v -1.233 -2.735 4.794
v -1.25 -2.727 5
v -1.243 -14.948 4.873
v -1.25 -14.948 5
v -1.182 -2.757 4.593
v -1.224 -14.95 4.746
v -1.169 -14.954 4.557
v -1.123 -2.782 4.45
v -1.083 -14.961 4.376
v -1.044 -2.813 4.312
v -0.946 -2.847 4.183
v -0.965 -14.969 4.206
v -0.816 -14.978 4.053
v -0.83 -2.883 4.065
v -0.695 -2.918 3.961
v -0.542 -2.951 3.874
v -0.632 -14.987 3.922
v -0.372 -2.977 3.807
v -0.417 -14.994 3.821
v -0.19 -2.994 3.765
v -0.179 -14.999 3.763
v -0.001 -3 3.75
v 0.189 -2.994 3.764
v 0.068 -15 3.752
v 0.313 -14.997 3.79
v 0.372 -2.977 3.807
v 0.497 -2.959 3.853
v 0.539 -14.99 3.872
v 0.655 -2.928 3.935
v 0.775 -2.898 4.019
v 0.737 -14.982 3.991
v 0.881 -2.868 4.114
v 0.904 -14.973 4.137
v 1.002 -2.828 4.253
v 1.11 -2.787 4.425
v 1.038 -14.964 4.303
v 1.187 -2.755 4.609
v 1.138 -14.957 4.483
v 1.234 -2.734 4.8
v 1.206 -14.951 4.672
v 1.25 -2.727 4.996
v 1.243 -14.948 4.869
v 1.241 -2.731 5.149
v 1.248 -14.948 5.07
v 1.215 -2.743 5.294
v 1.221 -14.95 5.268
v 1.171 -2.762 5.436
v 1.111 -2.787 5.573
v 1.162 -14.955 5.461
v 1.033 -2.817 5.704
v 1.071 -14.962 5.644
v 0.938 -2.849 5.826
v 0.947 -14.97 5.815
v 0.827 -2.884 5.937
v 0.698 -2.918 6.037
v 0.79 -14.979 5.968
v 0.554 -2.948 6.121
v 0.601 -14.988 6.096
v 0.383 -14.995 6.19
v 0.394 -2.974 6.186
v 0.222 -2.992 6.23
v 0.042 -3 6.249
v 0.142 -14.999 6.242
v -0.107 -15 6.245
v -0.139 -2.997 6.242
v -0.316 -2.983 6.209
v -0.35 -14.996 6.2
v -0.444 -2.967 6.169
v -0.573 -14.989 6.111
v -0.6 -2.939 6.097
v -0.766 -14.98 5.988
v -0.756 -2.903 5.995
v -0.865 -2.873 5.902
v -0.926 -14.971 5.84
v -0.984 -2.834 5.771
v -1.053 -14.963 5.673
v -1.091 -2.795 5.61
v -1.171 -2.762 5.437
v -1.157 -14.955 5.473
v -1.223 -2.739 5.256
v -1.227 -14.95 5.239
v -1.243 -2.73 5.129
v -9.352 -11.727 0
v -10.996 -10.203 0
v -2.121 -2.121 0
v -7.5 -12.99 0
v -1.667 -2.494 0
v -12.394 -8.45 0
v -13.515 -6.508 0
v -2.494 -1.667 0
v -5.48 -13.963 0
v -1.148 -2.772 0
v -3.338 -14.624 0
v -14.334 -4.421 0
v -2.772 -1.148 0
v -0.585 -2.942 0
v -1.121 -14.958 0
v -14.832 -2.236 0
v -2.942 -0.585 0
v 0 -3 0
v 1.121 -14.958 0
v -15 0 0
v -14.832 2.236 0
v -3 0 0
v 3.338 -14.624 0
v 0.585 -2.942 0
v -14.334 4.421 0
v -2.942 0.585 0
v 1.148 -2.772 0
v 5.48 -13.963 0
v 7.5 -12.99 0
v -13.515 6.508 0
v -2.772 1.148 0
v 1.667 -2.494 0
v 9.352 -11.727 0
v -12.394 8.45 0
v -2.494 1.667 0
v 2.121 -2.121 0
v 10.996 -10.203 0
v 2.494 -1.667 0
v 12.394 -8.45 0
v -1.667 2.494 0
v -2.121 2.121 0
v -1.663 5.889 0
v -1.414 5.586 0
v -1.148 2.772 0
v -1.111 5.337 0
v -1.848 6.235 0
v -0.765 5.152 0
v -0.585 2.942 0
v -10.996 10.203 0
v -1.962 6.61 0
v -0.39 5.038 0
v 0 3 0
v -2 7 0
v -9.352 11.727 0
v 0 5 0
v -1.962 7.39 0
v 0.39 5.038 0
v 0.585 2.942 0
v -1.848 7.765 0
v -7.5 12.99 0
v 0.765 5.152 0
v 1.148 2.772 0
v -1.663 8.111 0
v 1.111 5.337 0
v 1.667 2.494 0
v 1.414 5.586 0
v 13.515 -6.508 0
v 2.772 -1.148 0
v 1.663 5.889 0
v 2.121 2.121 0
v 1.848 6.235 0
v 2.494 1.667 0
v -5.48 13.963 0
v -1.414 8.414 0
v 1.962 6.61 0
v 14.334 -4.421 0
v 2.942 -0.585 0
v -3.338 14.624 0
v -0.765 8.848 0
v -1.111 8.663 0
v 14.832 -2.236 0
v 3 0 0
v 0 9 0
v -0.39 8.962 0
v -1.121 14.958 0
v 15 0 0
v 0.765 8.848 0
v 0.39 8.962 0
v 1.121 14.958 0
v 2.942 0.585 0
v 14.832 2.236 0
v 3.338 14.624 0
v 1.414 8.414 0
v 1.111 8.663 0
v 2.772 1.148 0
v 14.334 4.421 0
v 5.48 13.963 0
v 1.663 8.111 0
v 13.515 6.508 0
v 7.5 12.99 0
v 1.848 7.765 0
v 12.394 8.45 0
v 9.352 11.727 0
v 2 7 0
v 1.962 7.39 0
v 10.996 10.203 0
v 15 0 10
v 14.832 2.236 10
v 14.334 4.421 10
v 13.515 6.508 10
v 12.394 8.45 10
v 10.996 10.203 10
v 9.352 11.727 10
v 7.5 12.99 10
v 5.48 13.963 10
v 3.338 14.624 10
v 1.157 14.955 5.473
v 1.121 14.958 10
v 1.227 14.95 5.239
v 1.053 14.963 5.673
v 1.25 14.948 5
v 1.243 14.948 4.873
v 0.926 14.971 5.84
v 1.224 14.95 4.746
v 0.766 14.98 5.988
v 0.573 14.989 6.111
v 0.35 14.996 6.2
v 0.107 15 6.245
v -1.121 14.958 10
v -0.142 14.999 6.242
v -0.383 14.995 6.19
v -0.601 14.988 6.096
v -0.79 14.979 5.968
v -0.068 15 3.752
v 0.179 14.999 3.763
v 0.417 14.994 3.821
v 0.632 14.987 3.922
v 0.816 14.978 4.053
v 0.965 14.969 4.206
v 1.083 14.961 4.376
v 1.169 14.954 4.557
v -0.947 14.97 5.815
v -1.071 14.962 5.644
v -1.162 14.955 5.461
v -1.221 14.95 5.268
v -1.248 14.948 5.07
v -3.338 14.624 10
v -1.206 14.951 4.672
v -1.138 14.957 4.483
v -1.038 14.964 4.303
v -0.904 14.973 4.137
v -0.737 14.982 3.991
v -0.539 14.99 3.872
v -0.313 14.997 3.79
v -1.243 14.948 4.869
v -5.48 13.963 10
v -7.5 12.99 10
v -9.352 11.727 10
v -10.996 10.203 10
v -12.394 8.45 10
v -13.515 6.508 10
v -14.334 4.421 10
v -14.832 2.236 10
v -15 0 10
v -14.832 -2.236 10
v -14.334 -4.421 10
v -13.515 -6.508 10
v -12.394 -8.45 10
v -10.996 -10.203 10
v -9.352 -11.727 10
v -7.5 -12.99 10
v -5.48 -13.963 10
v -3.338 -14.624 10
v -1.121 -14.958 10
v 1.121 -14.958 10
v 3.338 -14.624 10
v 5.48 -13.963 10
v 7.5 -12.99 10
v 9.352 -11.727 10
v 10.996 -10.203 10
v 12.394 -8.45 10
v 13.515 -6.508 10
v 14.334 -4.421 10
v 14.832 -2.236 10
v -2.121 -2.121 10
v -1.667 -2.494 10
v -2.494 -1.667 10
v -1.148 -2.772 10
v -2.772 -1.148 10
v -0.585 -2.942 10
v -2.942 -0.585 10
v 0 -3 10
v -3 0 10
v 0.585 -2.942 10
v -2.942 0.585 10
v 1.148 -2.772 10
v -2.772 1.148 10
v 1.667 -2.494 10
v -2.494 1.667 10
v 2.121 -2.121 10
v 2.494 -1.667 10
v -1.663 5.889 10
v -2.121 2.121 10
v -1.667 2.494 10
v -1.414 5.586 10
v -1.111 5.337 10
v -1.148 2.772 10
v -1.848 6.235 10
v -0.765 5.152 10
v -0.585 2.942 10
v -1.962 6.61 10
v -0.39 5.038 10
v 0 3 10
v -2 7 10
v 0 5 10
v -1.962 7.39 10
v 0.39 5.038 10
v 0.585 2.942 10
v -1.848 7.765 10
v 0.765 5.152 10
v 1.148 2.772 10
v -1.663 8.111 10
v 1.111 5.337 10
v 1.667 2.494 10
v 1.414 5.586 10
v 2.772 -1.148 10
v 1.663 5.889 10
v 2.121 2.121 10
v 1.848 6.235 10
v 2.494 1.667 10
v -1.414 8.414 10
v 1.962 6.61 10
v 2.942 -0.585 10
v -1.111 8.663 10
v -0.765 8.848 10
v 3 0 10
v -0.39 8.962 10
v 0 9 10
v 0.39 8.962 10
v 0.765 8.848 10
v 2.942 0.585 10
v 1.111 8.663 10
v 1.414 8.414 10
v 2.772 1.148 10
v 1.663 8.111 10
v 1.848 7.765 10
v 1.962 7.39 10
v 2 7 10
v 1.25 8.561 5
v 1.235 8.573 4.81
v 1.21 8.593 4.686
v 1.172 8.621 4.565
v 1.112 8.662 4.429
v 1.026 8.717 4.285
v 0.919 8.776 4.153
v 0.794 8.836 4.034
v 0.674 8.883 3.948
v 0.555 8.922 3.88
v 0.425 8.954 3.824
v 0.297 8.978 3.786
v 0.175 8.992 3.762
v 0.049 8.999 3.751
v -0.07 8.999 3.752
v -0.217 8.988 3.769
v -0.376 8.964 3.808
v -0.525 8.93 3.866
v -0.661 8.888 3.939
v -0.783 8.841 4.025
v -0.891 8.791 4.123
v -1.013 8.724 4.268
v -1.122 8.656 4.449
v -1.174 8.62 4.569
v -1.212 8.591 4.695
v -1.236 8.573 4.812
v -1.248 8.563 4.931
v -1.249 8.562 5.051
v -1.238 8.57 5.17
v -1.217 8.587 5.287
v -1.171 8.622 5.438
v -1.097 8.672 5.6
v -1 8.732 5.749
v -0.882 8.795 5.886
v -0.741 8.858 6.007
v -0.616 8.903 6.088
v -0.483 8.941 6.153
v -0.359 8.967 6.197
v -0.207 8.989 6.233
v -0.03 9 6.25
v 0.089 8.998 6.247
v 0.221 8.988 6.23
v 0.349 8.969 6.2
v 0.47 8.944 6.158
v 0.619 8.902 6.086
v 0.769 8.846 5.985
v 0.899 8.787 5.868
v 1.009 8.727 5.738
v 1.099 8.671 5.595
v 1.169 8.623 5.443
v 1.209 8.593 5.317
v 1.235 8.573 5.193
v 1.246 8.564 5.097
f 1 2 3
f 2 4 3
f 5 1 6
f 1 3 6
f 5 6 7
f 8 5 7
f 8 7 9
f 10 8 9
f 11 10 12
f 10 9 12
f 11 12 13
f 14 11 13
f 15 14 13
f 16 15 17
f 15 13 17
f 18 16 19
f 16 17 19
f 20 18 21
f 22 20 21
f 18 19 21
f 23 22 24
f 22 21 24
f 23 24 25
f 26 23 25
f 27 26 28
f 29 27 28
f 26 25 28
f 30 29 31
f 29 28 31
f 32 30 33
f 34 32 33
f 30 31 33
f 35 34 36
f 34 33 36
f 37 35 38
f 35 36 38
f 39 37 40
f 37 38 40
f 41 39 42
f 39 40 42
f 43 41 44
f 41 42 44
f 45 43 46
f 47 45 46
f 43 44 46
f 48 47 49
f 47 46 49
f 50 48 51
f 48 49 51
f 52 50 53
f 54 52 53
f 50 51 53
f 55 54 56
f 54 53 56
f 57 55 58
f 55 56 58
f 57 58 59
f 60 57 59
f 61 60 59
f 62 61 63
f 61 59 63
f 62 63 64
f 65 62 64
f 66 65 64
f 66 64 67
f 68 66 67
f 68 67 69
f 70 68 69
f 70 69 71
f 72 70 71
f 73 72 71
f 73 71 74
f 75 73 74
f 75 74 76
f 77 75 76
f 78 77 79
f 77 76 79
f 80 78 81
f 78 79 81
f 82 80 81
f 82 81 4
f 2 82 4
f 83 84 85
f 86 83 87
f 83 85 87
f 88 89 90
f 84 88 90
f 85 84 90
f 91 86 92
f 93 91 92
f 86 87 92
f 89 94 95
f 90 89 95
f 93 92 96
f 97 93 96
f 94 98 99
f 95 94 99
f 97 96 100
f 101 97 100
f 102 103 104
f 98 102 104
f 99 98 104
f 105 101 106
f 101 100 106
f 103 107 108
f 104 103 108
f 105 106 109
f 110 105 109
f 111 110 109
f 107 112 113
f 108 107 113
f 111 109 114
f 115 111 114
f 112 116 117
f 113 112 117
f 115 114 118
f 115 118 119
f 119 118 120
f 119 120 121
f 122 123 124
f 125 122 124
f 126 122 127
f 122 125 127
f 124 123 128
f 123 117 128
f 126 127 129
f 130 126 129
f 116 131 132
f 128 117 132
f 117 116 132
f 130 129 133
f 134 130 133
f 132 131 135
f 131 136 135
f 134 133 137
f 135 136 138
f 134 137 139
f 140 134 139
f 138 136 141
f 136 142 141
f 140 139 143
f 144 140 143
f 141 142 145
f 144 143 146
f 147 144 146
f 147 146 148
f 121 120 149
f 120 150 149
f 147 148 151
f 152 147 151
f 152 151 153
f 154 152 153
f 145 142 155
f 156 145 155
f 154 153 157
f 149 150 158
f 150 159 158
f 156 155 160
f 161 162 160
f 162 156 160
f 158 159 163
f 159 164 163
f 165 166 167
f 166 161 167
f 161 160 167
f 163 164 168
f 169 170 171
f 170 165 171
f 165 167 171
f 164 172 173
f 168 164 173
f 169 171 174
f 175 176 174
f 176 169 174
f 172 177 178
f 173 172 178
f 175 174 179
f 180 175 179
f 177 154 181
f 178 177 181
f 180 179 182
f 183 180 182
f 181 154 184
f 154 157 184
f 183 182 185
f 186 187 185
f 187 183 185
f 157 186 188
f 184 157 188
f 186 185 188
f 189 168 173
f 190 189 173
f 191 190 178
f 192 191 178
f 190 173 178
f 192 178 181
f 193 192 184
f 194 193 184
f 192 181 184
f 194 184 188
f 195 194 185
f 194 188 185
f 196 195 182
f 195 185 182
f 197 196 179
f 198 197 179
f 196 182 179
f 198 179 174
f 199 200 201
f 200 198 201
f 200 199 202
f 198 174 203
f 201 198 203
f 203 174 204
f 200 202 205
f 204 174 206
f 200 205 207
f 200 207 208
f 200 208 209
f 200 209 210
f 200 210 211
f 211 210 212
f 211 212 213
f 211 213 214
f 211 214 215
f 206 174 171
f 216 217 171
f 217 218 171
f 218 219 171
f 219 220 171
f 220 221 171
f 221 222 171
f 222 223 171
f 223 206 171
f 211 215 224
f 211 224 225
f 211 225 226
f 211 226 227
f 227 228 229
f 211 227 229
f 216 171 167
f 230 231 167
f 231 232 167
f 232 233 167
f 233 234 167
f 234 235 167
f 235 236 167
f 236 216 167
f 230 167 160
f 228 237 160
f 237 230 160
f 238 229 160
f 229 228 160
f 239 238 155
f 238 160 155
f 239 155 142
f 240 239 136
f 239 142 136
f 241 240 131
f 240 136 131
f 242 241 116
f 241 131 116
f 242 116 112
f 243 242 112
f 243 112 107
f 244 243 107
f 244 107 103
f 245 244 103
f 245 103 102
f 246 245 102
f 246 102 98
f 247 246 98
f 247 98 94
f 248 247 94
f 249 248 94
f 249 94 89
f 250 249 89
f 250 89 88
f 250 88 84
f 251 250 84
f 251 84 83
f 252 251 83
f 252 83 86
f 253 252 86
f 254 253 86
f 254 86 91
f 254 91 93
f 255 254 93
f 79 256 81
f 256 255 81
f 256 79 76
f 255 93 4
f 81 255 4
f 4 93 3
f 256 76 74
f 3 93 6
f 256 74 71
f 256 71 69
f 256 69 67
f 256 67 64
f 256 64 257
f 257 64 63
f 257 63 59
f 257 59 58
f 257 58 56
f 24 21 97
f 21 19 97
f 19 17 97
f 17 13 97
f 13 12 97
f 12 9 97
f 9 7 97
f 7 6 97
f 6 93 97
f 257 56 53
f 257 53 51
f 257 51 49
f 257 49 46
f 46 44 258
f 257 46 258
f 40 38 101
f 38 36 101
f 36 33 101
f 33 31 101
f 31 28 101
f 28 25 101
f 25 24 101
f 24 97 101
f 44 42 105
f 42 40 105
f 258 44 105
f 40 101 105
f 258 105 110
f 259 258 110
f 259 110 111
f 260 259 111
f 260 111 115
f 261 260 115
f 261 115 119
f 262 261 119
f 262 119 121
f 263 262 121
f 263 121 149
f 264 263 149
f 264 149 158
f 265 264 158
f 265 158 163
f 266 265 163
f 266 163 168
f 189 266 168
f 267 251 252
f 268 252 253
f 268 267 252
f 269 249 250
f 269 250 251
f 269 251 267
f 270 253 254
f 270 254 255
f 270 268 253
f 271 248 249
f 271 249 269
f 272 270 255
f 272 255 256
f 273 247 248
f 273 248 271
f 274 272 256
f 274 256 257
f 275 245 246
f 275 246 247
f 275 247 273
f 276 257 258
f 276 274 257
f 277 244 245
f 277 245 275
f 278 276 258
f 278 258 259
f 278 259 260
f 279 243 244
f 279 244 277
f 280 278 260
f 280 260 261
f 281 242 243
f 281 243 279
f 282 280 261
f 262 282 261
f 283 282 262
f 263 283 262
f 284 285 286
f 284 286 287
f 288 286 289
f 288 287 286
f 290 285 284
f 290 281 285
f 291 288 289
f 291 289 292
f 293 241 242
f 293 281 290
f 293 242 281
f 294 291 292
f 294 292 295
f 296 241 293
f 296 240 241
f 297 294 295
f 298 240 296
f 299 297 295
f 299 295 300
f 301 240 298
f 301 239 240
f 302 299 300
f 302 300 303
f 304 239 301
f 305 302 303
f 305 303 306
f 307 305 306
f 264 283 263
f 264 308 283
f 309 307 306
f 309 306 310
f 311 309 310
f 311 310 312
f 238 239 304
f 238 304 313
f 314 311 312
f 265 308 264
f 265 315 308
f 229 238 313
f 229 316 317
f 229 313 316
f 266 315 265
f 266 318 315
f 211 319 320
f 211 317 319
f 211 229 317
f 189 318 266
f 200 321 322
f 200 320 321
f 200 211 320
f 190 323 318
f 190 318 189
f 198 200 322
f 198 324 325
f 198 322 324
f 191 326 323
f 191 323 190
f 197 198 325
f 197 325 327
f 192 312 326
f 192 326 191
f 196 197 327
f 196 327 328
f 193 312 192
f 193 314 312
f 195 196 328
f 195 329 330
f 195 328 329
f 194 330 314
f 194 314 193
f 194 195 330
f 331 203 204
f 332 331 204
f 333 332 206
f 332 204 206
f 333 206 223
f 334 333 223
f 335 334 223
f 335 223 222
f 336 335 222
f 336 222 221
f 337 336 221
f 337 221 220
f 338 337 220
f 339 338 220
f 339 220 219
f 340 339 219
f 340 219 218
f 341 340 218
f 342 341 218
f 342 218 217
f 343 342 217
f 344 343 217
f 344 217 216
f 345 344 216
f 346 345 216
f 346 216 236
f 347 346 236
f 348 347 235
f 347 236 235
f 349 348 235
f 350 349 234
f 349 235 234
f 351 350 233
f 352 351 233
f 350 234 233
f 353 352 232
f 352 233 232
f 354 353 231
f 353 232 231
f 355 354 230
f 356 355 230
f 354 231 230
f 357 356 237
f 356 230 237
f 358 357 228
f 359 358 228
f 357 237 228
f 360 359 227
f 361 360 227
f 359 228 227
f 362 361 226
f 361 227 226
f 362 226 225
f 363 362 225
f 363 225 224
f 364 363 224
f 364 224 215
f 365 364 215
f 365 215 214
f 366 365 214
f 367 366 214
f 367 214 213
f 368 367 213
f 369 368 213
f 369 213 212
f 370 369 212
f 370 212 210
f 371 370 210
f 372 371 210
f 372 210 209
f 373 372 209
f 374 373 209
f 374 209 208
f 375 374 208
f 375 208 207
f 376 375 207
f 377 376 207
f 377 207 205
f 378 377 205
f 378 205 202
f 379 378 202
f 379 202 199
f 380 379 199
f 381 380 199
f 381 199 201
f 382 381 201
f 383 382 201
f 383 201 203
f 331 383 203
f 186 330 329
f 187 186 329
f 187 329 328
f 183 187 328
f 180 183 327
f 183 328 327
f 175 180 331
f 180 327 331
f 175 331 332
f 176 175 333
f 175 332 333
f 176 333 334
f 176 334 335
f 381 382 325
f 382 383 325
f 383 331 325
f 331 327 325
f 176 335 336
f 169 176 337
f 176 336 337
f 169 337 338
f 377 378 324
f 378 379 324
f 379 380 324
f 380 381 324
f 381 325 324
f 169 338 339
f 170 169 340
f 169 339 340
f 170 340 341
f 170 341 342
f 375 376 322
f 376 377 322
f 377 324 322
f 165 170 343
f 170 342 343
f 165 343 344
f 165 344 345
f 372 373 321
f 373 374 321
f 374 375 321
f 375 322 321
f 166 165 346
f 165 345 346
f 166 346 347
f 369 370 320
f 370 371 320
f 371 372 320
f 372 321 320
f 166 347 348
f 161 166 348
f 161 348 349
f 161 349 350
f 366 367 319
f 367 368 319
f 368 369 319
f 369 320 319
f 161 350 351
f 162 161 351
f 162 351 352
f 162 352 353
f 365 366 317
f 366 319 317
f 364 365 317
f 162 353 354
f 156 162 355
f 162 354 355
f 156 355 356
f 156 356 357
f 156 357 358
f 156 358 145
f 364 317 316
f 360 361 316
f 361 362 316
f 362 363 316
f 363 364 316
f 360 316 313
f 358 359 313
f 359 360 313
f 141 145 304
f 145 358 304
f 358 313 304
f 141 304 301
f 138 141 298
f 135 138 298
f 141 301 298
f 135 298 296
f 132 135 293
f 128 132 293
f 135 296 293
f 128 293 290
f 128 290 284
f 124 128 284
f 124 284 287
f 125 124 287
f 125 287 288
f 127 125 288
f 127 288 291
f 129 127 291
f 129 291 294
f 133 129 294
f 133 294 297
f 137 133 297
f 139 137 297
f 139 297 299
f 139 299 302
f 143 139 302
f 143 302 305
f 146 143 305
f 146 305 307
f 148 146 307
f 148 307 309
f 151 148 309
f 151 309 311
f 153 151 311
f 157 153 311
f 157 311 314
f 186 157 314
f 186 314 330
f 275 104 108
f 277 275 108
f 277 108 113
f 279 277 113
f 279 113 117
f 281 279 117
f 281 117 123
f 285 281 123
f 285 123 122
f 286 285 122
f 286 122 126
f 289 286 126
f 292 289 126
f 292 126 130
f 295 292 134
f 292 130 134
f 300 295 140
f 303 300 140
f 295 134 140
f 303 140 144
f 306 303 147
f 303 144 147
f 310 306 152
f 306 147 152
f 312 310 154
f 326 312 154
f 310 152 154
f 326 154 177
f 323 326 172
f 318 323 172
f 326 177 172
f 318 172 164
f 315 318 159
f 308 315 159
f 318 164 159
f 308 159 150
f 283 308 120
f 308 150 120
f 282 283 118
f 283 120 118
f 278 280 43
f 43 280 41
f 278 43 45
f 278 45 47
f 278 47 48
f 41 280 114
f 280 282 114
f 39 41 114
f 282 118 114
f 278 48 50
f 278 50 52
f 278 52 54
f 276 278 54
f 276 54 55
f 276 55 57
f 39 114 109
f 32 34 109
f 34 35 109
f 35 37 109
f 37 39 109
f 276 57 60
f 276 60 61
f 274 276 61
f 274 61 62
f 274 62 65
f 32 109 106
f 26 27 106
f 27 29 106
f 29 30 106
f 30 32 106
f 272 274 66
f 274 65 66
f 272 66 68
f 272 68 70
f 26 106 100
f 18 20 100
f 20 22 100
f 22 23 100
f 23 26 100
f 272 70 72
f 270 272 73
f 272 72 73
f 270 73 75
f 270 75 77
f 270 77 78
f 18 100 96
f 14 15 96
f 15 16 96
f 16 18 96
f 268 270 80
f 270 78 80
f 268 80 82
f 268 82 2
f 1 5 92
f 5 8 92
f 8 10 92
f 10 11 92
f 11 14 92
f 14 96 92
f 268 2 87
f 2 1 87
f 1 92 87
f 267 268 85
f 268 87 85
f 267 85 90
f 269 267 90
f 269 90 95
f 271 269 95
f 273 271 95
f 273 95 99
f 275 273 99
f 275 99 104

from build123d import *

# Parameters (mm, degrees)
SKETCH_1_R          = 15
EXTRUDE_1_DEPTH     = 10
SKETCH_3_R          = 3
CUT_EXTRUDE_1_DEPTH = 24.452078799
SKETCH_2_R          = 2
CUT_EXTRUDE_2_DEPTH = 24.452078799
M3X0_5_1_REACH      = 35.912
M3X0_5_1_BORE_R     = 1.25
M3X0_5_2_REACH      = 35.912
M3X0_5_2_BORE_R     = 1.25


with BuildPart() as part:
    # ｽｹｯﾁ1 → ﾎﾞｽ - 押し出し1 (new body)
    with BuildSketch(Plane.XY):
        Circle(SKETCH_1_R)
    extrude(amount=EXTRUDE_1_DEPTH)

    # ｽｹｯﾁ3 → ｶｯﾄ - 押し出し1 (cut, through all)
    with BuildSketch(Plane(origin=(0, 0, 0), x_dir=(-1, 0, 0), z_dir=(0, 0, -1))):
        Circle(SKETCH_3_R)
    extrude(amount=-CUT_EXTRUDE_1_DEPTH, mode=Mode.SUBTRACT)

    # ｽｹｯﾁ2 → ｶｯﾄ - 押し出し2 (cut, through all)
    with BuildSketch(Plane.XY.offset(10)):
        with Locations((0, 7)):
            Circle(SKETCH_2_R)
    extrude(amount=-CUT_EXTRUDE_2_DEPTH, mode=Mode.SUBTRACT)

    # M3x0.5 ねじ穴1 bore (on position points) → M3x0.5 ねじ穴1 (cut, up to next)
    with BuildSketch(Plane(origin=(0, 15, 5), x_dir=(1, 0, 0), z_dir=(0, 1, 0)), mode=Mode.PRIVATE) as m3x0_5_1_sk1:
        Circle(M3X0_5_1_BORE_R)
    m3x0_5_1_tool1 = extrude(m3x0_5_1_sk1.sketch, amount=-M3X0_5_1_REACH, mode=Mode.PRIVATE) & part.part
    add(m3x0_5_1_tool1.solids().sort_by_distance((0, 15, 5))[0], mode=Mode.SUBTRACT)

    # M3x0.5 ねじ穴2 bore (on position points) → M3x0.5 ねじ穴2 (cut, up to next)
    with BuildSketch(Plane(origin=(0, -15, 5), x_dir=(-1, 0, 0), z_dir=(0, -1, 0)), mode=Mode.PRIVATE) as m3x0_5_2_sk1:
        Circle(M3X0_5_2_BORE_R)
    m3x0_5_2_tool1 = extrude(m3x0_5_2_sk1.sketch, amount=-M3X0_5_2_REACH, mode=Mode.PRIVATE) & part.part
    add(m3x0_5_2_tool1.solids().sort_by_distance((0, -15, 5))[0], mode=Mode.SUBTRACT)


solid = part.part
